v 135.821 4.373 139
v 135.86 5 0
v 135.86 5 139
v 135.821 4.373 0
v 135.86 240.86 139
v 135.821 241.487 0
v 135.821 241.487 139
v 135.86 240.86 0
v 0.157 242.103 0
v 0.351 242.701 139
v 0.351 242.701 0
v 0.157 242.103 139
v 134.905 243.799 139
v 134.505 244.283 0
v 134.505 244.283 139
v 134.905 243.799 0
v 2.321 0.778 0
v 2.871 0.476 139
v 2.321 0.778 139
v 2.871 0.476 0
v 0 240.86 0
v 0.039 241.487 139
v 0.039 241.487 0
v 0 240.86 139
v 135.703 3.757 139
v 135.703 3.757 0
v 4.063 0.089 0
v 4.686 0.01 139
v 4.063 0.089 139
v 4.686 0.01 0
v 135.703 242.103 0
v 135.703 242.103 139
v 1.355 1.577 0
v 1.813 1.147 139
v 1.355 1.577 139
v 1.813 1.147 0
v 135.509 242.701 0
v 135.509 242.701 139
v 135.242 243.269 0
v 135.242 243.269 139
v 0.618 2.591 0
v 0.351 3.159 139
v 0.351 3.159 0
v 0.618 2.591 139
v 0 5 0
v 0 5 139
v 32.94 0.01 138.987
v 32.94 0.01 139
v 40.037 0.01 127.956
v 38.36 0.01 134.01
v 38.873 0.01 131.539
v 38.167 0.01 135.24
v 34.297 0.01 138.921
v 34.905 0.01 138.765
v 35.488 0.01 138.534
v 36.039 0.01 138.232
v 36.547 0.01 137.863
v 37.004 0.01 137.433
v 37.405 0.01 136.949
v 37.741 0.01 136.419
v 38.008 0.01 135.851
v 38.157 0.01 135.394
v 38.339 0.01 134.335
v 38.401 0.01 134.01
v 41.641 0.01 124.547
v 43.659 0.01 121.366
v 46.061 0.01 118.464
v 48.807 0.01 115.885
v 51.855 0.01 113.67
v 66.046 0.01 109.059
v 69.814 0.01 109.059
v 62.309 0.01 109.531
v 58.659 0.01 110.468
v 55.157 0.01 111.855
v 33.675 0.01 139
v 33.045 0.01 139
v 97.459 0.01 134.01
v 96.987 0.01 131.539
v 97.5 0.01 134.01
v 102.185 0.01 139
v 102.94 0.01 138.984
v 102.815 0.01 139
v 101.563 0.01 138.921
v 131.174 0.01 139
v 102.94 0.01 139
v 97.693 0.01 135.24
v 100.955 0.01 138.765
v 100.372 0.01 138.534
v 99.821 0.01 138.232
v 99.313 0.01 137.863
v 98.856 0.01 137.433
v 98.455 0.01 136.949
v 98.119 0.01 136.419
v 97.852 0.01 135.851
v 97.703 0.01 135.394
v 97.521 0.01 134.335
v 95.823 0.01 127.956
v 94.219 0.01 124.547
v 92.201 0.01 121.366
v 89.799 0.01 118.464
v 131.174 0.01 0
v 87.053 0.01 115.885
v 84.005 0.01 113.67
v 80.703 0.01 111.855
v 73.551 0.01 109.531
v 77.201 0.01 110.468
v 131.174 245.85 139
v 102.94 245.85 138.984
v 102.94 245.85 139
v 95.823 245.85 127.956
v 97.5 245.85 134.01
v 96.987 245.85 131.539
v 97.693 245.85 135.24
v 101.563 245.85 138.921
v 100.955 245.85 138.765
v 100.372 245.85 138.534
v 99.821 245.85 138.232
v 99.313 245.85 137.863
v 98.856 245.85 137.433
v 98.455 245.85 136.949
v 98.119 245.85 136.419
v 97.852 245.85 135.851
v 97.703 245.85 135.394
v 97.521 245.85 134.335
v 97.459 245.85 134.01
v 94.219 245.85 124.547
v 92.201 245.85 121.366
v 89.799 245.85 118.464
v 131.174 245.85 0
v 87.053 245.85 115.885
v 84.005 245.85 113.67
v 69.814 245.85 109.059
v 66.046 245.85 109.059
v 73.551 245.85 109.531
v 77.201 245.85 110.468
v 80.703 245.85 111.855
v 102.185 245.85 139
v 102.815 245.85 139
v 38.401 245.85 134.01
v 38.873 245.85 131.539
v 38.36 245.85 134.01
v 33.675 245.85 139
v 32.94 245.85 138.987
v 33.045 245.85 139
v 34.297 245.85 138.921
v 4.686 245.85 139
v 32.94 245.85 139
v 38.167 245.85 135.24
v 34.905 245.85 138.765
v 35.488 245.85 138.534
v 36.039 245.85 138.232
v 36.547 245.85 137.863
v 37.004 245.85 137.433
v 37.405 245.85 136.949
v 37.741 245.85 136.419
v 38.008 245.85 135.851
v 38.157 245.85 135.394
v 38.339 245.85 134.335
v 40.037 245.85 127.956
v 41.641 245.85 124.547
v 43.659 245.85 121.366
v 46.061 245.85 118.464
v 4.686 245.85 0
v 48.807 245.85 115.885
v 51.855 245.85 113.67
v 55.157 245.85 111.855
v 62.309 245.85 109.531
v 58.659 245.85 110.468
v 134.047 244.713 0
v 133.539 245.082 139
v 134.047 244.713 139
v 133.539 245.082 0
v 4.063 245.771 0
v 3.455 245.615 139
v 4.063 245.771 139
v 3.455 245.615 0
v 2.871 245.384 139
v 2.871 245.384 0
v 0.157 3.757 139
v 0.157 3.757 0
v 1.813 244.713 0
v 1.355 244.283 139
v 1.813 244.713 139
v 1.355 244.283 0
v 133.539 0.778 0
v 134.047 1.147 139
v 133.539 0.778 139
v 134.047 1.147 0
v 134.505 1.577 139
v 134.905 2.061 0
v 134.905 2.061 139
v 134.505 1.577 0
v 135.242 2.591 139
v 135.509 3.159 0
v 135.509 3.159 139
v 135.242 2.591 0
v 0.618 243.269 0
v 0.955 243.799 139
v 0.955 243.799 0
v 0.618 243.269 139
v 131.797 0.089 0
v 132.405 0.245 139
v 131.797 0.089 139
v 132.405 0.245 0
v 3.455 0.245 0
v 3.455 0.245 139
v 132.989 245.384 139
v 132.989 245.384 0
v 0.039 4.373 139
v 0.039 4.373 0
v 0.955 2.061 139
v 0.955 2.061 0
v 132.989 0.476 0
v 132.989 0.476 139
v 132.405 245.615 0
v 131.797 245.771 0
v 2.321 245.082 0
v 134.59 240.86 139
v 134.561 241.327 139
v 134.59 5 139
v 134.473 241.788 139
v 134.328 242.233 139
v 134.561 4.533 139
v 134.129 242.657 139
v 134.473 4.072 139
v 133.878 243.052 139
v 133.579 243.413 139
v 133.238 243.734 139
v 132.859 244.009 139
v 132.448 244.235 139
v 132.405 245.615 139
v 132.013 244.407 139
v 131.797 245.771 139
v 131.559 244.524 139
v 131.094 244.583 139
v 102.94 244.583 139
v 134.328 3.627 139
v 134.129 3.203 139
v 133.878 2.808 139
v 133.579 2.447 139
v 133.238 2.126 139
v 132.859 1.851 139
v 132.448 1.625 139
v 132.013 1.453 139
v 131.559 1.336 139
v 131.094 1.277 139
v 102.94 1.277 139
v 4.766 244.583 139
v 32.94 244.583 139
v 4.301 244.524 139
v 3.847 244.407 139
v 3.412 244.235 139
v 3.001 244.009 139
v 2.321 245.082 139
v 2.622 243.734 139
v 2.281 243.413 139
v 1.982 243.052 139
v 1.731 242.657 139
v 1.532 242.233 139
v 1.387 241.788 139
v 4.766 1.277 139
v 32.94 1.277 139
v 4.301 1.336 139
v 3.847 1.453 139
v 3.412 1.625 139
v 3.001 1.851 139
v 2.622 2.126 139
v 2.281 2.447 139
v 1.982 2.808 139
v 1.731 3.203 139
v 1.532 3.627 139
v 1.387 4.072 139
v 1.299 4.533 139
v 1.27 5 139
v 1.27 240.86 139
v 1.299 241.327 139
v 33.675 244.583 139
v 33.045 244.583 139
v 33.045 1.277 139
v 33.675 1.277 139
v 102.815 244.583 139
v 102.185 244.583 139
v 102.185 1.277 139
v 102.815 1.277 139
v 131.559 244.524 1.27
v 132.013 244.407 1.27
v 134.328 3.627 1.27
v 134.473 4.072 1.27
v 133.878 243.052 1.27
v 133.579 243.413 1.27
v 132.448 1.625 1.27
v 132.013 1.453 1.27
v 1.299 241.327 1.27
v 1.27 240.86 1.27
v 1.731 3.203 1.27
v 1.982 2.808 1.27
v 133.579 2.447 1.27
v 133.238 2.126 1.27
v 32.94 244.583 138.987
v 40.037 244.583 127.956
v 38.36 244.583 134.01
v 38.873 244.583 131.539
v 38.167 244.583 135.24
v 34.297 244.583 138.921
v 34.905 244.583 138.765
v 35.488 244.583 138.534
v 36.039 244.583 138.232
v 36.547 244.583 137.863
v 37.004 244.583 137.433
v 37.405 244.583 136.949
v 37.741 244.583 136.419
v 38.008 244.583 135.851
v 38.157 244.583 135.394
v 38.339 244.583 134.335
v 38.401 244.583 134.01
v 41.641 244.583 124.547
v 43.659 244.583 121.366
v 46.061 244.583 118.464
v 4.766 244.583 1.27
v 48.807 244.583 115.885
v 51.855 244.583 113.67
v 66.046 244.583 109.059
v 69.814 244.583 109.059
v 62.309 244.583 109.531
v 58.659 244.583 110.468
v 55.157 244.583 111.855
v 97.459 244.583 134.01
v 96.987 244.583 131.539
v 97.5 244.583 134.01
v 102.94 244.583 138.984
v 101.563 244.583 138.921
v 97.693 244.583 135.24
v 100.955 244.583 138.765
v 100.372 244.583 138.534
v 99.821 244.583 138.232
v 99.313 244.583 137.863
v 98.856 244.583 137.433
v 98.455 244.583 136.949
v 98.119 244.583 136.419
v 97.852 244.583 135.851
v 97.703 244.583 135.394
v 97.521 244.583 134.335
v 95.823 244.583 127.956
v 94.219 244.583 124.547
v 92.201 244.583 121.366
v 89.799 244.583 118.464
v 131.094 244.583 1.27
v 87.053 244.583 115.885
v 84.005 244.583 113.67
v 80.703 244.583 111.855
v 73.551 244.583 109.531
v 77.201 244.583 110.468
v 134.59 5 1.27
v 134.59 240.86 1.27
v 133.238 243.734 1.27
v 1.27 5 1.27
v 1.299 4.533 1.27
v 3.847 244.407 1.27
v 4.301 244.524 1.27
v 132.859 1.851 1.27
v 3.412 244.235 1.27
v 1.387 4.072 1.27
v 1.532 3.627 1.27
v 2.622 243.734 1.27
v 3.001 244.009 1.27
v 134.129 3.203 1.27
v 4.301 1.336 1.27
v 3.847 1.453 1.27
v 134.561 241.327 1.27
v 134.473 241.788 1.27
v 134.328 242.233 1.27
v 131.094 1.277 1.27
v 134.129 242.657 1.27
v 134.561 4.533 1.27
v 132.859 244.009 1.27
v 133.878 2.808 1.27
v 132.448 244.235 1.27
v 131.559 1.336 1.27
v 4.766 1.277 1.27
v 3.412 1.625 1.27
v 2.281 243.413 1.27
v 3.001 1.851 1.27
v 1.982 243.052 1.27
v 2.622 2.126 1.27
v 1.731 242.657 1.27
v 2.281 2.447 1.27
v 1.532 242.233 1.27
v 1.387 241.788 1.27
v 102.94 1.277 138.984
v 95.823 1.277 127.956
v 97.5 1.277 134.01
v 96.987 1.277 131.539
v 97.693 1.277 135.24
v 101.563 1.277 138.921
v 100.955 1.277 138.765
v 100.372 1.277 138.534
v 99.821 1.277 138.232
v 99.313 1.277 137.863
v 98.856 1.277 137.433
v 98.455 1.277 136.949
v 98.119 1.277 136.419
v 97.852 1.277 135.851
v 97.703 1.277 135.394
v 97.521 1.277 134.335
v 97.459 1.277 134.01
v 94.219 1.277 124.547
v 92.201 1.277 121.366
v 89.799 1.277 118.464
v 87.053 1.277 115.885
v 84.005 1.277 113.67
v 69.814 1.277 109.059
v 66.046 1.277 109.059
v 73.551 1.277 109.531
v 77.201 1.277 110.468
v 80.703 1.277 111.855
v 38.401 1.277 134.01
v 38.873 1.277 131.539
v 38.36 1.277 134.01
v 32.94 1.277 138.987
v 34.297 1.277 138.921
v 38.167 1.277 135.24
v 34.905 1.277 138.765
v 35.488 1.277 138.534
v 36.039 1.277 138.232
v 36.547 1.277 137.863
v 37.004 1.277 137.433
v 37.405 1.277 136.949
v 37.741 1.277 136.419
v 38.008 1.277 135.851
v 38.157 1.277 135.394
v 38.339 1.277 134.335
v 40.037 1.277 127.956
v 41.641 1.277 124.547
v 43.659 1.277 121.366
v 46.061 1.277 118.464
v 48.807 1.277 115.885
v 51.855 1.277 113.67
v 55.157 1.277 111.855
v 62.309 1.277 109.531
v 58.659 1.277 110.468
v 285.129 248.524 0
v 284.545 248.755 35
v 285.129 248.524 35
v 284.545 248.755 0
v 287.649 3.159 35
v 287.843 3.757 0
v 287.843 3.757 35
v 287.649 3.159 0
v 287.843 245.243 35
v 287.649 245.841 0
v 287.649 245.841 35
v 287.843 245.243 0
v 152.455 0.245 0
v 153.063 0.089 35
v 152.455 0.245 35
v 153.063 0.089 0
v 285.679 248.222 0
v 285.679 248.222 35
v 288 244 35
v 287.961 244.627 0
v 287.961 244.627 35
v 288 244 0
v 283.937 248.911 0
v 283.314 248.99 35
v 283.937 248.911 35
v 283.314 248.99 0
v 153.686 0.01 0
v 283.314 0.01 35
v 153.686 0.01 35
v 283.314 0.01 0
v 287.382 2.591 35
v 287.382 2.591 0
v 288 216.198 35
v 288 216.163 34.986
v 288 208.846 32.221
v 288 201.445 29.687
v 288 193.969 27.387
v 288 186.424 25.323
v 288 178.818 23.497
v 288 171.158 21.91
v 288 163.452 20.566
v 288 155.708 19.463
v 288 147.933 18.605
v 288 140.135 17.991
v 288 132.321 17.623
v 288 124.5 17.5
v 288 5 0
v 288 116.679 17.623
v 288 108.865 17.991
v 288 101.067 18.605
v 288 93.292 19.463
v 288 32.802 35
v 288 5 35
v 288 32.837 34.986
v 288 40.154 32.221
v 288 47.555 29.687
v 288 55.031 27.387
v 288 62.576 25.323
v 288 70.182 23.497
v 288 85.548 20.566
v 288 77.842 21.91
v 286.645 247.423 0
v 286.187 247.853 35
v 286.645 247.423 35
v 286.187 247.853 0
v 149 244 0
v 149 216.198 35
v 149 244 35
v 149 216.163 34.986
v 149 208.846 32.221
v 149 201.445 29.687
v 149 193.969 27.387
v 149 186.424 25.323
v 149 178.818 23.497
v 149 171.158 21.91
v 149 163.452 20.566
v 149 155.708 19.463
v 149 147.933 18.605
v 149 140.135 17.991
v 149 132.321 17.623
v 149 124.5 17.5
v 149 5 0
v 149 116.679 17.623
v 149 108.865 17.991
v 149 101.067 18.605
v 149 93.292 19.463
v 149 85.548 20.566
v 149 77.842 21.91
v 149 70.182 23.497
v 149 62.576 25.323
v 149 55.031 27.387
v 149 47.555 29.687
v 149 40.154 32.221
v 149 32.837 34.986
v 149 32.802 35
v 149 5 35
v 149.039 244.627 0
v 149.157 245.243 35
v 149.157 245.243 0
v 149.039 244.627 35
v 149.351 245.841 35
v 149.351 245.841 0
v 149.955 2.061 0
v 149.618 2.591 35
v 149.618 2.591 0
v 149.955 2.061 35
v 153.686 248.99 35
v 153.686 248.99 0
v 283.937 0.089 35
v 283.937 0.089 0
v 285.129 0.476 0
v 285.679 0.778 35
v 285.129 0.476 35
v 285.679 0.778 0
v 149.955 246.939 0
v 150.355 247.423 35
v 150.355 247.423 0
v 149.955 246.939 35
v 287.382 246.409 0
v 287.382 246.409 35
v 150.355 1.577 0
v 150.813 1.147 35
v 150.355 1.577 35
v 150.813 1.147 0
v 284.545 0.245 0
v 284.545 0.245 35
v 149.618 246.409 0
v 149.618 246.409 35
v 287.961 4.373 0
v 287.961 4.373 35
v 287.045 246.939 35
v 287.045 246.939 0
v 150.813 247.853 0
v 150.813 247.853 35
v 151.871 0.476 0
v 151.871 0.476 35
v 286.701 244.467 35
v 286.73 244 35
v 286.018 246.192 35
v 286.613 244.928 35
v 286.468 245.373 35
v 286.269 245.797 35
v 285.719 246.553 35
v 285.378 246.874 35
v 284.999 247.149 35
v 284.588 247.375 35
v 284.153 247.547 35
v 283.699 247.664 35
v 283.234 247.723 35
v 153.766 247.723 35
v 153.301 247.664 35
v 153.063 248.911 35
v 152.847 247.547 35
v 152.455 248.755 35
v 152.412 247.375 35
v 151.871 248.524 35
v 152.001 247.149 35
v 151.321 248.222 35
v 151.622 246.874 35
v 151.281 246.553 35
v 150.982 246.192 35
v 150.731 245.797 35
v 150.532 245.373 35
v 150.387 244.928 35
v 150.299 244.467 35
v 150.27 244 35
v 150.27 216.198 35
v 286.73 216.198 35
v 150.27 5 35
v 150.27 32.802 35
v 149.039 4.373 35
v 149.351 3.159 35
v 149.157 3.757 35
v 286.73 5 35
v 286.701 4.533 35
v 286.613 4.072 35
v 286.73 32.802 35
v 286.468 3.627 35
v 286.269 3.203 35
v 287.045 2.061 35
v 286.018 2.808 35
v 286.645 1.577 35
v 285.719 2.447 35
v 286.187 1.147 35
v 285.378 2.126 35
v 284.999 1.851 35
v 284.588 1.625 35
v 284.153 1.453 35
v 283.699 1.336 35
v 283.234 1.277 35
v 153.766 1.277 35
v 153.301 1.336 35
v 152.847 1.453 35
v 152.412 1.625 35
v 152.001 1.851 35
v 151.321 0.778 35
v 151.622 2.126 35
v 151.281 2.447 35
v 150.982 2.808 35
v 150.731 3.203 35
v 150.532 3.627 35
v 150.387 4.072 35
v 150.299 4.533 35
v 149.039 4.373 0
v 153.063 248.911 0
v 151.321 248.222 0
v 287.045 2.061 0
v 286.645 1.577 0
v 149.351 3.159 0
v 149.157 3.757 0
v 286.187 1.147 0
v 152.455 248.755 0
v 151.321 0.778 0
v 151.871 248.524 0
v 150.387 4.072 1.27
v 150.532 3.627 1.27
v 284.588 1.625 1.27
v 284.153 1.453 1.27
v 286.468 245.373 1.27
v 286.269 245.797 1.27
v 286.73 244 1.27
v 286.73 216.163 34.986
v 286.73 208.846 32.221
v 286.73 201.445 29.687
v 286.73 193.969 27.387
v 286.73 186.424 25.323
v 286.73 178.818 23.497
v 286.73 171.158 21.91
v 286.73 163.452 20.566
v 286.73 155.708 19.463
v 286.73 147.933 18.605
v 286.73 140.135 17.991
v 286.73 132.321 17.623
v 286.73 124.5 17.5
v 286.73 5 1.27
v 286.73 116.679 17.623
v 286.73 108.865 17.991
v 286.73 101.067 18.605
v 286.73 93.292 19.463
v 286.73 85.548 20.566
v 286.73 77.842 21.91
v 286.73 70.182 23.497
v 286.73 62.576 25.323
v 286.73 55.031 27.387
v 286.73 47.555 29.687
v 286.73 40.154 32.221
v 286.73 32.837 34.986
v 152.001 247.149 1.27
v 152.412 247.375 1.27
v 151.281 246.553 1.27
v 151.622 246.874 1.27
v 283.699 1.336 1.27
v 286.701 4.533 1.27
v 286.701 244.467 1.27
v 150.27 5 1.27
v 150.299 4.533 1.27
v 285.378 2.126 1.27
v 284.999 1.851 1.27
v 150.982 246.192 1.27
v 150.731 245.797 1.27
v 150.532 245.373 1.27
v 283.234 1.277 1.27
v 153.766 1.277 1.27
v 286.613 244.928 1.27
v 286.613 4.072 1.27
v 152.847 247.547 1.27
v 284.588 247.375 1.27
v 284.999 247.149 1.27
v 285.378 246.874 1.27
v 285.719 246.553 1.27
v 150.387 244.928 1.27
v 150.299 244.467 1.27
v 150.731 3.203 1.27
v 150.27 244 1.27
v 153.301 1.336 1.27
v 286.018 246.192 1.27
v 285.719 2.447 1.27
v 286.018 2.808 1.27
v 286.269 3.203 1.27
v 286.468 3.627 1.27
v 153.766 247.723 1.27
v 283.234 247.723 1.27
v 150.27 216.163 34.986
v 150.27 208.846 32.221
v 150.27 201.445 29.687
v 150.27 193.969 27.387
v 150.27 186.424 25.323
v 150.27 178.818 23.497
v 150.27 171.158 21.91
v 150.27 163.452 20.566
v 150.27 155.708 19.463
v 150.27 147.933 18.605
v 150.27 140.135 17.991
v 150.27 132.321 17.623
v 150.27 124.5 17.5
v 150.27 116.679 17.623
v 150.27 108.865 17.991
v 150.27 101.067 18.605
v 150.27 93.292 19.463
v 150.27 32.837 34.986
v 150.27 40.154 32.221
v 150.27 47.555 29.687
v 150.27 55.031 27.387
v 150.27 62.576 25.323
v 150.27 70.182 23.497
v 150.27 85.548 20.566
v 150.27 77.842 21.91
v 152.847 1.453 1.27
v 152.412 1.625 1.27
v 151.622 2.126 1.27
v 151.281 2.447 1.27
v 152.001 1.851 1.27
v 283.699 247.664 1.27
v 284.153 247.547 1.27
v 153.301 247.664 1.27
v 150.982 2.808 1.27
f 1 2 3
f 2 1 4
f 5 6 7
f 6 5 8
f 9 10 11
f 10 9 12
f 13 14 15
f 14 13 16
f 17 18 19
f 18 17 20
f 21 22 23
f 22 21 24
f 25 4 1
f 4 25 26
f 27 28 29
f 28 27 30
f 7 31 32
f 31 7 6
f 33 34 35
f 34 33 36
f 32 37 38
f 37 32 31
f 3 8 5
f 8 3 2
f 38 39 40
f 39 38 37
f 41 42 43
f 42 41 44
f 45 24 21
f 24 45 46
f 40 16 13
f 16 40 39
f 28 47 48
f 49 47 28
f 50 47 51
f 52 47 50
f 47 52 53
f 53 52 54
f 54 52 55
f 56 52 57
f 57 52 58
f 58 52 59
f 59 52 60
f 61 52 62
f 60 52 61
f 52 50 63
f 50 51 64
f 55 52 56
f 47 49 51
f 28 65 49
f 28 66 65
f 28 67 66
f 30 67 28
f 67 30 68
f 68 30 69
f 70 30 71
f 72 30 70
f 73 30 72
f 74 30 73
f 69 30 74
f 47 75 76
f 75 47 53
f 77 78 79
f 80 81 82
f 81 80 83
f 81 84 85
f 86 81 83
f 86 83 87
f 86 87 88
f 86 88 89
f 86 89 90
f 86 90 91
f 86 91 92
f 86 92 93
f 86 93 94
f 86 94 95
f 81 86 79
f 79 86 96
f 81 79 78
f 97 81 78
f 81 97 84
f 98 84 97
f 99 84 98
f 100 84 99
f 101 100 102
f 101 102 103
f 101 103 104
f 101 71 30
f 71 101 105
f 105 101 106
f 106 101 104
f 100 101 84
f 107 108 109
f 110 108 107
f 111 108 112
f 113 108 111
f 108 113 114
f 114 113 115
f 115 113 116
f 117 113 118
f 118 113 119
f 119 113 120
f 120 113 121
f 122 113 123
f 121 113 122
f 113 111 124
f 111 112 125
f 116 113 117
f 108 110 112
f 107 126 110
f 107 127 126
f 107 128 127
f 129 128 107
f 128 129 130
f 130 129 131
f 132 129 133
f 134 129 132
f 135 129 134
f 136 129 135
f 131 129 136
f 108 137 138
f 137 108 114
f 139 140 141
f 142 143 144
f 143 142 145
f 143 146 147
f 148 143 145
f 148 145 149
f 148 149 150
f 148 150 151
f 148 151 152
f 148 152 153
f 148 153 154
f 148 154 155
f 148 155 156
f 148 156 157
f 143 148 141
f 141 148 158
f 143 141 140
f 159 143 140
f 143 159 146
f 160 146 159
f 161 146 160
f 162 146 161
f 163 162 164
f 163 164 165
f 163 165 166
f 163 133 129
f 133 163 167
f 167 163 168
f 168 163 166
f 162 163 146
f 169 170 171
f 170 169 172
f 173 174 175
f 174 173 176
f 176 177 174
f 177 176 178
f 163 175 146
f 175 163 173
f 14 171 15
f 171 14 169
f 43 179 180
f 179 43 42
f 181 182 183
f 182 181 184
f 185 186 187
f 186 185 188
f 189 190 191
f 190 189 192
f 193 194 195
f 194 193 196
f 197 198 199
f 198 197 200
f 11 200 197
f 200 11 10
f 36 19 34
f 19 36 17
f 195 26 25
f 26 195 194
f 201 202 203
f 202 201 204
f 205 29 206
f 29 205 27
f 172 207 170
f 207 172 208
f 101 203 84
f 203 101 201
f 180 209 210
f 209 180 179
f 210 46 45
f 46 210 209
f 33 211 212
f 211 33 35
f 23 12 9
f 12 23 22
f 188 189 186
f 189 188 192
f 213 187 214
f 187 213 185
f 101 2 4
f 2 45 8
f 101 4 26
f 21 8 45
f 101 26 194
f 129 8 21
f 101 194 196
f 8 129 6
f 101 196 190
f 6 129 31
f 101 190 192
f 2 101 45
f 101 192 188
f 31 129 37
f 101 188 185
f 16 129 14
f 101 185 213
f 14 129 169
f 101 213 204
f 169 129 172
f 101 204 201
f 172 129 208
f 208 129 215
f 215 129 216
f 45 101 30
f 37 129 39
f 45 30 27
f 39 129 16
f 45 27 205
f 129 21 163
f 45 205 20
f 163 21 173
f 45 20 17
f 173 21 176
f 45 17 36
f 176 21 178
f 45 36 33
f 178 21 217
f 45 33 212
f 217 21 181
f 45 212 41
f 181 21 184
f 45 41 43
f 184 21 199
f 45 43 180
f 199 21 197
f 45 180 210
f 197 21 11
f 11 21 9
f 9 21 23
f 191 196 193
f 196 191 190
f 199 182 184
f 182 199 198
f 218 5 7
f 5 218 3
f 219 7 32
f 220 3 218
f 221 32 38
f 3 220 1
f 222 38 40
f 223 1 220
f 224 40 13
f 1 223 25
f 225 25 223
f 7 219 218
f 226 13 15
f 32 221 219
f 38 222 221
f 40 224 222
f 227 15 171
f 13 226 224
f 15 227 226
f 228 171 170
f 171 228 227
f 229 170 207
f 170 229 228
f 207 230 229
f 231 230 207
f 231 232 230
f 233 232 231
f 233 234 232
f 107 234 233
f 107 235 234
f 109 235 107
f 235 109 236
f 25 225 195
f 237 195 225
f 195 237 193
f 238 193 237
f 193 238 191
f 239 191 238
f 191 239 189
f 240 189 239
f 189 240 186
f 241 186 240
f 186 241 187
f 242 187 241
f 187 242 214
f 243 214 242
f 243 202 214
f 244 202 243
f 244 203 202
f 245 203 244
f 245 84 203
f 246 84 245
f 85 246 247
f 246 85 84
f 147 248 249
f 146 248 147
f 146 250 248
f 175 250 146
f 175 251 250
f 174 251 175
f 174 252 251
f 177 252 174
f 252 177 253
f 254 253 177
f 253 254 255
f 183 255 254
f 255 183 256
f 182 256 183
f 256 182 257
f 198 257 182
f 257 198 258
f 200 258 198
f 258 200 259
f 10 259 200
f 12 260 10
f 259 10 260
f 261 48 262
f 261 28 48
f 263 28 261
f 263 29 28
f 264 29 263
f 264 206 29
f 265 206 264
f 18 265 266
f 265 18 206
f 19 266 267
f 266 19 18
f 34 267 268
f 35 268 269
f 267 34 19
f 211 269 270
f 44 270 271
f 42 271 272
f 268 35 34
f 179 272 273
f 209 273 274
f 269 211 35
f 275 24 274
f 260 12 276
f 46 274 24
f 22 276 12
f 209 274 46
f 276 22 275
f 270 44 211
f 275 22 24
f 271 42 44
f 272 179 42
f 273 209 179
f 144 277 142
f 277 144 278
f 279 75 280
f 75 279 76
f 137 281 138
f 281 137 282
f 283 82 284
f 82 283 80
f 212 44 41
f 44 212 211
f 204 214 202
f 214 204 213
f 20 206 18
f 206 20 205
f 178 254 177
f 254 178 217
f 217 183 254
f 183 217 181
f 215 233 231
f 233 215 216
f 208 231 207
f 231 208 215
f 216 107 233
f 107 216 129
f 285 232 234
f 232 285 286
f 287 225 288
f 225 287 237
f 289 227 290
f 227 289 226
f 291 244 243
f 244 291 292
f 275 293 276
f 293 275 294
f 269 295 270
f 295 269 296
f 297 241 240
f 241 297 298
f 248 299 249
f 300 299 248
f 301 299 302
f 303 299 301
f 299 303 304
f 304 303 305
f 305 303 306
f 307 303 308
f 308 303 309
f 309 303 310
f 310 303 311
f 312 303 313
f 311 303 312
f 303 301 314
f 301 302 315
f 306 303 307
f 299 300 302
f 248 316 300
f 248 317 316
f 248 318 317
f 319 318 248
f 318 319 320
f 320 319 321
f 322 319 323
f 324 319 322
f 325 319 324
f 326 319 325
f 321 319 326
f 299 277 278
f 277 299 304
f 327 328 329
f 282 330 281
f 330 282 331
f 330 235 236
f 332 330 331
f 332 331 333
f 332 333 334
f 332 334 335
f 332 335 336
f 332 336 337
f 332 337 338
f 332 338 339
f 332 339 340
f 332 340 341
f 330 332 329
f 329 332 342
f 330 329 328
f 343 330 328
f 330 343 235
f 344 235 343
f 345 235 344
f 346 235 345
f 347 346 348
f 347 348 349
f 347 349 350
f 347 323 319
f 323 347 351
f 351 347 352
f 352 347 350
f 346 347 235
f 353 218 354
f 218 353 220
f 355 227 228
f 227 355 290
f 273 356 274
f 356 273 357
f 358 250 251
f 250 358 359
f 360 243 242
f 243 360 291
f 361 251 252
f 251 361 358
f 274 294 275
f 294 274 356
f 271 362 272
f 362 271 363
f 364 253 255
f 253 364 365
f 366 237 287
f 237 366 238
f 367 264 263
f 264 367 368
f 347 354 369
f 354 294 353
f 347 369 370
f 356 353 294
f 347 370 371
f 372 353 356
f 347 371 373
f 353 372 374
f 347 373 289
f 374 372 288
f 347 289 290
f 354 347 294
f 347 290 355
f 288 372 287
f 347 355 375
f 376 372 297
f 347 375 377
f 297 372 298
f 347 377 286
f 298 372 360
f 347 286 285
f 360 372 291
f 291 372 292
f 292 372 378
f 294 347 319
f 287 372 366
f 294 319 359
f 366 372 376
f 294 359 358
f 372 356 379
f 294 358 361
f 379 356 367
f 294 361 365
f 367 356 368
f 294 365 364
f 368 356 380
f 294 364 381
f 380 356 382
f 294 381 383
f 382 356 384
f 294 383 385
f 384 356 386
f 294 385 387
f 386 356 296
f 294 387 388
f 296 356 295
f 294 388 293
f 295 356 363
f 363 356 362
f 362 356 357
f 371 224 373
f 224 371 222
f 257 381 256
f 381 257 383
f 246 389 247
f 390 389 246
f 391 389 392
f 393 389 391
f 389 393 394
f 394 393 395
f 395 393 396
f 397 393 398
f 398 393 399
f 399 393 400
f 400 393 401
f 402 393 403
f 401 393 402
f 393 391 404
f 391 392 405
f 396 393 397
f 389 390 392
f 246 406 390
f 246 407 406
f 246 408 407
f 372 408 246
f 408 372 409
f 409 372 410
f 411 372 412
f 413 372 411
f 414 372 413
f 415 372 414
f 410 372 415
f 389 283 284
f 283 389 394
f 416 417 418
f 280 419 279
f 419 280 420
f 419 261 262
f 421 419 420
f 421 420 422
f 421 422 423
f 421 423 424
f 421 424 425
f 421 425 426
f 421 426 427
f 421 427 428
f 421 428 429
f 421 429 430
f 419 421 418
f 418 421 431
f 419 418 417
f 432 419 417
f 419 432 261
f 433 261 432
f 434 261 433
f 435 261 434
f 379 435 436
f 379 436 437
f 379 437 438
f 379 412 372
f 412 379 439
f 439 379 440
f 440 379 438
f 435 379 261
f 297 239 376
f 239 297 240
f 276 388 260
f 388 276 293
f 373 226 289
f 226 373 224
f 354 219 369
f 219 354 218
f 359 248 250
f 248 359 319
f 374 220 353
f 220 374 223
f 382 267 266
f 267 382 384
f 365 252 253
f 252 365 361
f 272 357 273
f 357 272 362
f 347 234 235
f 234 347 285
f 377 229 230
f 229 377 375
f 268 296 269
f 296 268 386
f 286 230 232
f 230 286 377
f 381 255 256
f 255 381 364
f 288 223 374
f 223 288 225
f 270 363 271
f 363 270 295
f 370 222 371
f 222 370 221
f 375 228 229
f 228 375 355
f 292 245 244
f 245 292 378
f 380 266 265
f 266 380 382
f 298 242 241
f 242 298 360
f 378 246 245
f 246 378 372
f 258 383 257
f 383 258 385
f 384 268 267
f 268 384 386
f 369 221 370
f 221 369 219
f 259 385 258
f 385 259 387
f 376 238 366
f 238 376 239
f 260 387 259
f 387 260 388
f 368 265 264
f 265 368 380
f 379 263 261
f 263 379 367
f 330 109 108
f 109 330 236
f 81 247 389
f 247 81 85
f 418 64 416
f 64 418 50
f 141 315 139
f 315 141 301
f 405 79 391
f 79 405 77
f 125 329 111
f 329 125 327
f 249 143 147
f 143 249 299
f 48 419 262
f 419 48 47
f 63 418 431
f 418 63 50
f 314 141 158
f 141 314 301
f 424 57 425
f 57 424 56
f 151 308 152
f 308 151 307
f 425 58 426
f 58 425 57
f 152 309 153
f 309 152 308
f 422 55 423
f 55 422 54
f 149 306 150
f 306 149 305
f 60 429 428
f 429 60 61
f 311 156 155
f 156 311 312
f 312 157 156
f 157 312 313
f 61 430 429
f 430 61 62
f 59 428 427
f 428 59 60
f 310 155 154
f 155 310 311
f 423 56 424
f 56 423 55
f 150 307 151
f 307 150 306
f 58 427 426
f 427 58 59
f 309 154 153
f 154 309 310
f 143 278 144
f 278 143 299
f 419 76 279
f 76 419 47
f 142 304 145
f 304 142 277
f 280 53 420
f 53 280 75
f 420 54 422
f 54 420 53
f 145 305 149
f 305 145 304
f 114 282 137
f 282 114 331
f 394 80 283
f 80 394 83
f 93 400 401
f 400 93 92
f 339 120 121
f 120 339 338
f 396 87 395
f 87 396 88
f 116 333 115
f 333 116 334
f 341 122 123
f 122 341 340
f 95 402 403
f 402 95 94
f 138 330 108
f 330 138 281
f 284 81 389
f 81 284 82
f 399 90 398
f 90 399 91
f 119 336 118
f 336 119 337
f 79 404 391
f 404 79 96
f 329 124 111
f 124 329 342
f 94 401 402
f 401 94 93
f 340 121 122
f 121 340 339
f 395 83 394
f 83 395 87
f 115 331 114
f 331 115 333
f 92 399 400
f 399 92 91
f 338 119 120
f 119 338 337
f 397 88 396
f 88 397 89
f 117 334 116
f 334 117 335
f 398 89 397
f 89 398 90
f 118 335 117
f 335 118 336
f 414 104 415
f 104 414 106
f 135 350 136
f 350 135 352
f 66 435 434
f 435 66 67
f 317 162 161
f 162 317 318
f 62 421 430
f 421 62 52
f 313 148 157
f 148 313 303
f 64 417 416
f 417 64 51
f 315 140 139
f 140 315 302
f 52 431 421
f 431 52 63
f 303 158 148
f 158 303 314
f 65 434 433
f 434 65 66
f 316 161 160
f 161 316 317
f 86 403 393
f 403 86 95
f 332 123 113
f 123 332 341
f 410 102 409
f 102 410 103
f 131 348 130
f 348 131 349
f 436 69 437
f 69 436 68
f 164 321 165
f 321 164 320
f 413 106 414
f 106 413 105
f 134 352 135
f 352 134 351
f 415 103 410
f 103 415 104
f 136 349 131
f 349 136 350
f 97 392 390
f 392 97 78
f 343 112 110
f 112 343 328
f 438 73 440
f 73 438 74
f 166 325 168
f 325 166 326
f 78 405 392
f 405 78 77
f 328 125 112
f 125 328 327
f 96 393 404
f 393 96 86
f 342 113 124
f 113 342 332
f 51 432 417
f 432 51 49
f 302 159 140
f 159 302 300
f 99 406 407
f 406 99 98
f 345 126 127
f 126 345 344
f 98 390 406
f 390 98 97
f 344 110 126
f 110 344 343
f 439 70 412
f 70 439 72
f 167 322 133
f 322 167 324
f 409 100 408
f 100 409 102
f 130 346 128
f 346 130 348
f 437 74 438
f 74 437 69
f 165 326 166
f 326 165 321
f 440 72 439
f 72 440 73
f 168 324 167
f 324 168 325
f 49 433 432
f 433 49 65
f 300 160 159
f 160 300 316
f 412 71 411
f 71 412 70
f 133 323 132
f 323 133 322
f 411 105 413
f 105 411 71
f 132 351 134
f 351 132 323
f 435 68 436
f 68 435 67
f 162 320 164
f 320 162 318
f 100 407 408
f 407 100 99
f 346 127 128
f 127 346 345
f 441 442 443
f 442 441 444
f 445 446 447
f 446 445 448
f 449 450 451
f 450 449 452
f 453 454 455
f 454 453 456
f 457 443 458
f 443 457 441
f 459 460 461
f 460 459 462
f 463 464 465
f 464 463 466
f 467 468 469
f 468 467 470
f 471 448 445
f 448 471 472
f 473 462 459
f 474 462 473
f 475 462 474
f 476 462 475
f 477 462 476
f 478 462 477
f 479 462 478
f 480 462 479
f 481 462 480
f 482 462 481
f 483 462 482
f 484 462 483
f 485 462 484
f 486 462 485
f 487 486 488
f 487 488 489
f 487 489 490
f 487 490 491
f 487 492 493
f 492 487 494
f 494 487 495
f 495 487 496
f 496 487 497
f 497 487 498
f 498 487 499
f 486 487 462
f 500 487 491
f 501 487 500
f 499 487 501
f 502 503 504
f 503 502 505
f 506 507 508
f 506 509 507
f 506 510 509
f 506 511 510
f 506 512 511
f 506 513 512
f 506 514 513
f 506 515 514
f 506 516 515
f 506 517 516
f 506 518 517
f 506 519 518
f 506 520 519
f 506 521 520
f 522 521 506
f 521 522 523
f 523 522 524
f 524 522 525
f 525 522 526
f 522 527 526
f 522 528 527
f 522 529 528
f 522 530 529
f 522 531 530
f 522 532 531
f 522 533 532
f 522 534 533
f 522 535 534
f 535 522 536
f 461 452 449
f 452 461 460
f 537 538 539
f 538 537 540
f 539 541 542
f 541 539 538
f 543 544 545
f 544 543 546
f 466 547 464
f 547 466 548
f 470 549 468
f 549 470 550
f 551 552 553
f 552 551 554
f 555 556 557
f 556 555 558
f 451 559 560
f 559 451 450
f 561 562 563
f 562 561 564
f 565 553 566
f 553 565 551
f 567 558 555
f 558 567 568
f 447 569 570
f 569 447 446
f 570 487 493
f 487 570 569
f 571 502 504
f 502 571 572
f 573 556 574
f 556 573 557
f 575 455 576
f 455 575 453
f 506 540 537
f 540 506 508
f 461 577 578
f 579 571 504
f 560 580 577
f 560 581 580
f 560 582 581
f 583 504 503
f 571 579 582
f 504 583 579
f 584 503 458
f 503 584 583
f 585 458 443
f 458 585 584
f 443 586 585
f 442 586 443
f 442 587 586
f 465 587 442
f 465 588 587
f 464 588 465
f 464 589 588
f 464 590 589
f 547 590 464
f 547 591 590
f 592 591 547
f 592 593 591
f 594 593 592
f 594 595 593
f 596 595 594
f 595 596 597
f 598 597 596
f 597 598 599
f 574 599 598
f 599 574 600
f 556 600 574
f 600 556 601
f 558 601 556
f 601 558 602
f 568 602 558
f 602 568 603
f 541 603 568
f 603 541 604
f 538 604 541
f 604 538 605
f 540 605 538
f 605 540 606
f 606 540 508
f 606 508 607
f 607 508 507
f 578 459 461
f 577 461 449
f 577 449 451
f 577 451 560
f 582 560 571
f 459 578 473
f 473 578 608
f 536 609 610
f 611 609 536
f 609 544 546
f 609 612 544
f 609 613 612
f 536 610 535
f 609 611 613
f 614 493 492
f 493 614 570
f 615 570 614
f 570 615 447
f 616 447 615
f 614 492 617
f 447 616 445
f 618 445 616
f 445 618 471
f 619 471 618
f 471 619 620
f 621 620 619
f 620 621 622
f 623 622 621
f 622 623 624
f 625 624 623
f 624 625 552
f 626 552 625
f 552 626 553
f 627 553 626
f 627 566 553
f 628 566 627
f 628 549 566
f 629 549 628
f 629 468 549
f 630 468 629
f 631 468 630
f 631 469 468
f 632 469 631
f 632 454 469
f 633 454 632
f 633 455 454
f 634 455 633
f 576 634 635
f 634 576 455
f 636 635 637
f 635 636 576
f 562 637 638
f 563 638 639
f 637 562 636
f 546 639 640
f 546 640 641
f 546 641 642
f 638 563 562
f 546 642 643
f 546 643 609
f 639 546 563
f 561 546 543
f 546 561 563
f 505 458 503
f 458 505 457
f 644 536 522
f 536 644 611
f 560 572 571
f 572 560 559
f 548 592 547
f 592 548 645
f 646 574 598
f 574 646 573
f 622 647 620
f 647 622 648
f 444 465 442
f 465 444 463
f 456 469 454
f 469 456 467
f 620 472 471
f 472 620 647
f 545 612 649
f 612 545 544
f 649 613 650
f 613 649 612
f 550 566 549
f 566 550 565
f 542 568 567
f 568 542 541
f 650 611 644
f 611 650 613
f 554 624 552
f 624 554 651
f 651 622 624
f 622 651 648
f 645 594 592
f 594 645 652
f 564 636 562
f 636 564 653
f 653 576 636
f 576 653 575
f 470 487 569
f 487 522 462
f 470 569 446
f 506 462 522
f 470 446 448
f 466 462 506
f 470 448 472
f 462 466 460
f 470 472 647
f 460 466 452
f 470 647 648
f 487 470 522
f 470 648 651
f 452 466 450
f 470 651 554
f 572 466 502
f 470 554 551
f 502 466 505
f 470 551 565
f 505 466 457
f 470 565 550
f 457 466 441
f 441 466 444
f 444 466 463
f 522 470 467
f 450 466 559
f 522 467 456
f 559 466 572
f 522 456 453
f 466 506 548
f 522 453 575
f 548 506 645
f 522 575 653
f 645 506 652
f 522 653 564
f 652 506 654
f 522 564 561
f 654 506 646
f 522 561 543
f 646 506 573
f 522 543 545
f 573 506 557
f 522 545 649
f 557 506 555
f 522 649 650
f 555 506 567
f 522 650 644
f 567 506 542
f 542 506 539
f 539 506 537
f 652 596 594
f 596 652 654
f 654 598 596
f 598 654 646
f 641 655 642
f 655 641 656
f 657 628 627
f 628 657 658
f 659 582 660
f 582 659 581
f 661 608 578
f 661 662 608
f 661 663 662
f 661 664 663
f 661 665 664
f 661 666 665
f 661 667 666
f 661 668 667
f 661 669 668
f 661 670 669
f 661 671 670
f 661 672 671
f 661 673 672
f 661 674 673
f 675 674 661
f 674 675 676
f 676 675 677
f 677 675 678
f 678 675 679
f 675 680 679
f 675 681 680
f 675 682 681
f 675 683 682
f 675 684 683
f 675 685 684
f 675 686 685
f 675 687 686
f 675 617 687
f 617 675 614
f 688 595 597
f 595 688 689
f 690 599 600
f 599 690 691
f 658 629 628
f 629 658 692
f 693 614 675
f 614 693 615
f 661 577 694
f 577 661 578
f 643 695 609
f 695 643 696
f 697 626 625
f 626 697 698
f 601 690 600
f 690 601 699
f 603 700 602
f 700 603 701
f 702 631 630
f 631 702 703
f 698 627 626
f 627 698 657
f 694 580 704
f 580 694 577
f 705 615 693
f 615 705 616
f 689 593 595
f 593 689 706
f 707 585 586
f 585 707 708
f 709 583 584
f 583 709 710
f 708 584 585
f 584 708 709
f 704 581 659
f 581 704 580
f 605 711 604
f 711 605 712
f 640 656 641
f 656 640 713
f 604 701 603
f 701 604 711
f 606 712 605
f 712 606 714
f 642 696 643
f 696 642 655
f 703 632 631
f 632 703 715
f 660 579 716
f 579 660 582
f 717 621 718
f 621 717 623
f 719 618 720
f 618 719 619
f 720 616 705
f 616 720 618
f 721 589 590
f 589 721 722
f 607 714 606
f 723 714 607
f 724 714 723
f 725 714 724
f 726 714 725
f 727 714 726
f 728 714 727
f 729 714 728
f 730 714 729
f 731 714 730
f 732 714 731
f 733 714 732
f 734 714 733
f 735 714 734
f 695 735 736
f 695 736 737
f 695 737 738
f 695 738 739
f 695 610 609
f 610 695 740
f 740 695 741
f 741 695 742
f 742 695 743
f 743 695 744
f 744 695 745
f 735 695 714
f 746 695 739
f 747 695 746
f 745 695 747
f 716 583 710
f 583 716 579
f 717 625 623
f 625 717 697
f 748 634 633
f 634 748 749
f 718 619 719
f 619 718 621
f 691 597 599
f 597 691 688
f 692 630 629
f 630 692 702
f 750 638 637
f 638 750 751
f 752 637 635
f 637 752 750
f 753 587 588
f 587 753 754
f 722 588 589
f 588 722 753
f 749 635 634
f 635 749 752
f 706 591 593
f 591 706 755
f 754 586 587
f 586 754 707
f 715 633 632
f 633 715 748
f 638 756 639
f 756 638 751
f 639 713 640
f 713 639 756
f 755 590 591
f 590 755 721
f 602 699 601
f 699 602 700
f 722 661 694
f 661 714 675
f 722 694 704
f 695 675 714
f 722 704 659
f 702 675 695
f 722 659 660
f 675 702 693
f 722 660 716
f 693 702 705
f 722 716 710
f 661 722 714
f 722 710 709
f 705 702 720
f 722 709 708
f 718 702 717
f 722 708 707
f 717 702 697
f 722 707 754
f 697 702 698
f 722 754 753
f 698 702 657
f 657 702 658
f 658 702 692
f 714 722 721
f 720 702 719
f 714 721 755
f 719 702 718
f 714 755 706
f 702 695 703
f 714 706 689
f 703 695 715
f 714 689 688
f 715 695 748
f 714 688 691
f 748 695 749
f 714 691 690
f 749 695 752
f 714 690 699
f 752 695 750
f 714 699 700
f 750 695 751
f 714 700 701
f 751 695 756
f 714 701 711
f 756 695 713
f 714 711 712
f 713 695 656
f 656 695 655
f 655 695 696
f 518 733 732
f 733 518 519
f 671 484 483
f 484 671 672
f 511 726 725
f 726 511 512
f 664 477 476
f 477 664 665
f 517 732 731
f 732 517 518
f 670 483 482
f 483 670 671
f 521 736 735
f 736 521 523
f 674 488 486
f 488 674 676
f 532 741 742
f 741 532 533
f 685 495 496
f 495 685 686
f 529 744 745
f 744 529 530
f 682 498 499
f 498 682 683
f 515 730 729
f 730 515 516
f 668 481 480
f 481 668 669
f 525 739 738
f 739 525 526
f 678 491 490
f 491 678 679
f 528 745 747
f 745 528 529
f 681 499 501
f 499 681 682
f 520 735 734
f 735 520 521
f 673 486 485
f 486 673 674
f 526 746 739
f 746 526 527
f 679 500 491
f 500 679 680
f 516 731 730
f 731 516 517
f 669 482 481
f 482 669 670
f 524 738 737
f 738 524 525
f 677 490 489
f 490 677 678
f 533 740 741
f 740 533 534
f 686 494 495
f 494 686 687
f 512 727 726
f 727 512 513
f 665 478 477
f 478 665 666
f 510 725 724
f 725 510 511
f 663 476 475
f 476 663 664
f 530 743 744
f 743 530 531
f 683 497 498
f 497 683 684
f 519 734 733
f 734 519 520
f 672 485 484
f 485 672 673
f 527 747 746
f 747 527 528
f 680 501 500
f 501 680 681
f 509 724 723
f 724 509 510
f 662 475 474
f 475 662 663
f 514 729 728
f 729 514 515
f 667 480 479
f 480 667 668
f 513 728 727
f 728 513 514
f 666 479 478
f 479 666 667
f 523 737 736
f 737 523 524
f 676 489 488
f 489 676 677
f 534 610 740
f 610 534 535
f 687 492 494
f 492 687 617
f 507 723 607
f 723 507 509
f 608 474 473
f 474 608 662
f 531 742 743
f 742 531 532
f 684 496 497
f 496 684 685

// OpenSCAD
generate_lid=true;
generate_box=true;

width=139;
length=249;
height=139;

wall_thickness=1.27;
cutout_size=30;
clearance=0.3;
fillet_size=5;

i_width=width-2*wall_thickness-2*clearance;
i_length=length-2*wall_thickness-2*clearance;
cutout_fillet=cutout_size/6;
lid_height=cutout_size+5;
lid_cutout_depth=lid_height/2;

$fn=50;
// inside box
if(generate_box) {
    difference()
    {
        // generate basic shape
        base_box(i_width, i_length, height);
        
        // subtracting main cutout
        translate([i_width/2, i_length+0.01, height]) rotate(a=90, v=[1,0,0]) cylinder(r=cutout_size, h=i_length+0.02);
        
        // subtracting cutout fillets
        difference()
        {
            translate([i_width/2-cutout_size-cutout_fillet+0.01, 0,  height-cutout_fillet+0.01]) cube([2*(cutout_fillet+cutout_size), i_length+0.02, cutout_fillet]);
            translate([i_width/2-sqrt(cutout_size*cutout_size-cutout_fillet*cutout_fillet)-cutout_fillet+0.01, i_length+0.01, height-cutout_fillet+0.01]) rotate(a=90, v=[1,0,0]) cylinder(r=cutout_fillet, h=i_length+0.02);
            translate([i_width/2+sqrt(cutout_size*cutout_size-cutout_fillet*cutout_fillet)+cutout_fillet-0.01, i_length+0.01, height-cutout_fillet+0.01]) rotate(a=90, v=[1,0,0]) cylinder(r=cutout_fillet, h=i_length+0.02);
        }
    }
}

// lid
if(generate_lid) {
    translate([generate_box ? width+10 : 0,0,0])
    {
        
        difference()
        {
            base_box(width, length, lid_height);
            translate([-0.01,length/2,length+lid_height-lid_cutout_depth]) rotate(a=90, v=[0,1,0]) cylinder(r=length, h=width+0.02, $fn=200);
        }
        
    }
}


module base_box (width, length, height)
{
    translate(fillet_size*[1,1,0])
    {
        difference()
        {
            minkowski()
            {
                cube([width, length, height] - fillet_size*[2,2,1]);
                cylinder(r=fillet_size, h=fillet_size);
            }
            
            translate(wall_thickness*[0,0,1]) 
            {
                minkowski()
                {
                    cube([width,length,height+0.01] - fillet_size*[2,2,1]);
                    cylinder(r=fillet_size-wall_thickness, h=fillet_size);
                }
            }
        }
    }
}
